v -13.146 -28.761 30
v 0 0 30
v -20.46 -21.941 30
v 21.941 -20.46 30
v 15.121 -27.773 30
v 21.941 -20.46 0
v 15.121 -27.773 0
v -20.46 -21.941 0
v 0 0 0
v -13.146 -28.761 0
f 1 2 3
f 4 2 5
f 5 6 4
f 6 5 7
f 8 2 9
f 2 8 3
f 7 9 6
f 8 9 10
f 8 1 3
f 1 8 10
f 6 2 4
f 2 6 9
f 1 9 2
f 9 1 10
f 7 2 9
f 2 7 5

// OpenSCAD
rotate([0,0,182])
rotate([0,-90,0]){
    difference(){
        rotate([-45,0,0]) {
            cube([30, 30, 30]);
        }
        scale([1,2,1]) {
            rotate([-45,0,0]) {
                cube([30, 30, 30]);
            }
        }
    }
}
